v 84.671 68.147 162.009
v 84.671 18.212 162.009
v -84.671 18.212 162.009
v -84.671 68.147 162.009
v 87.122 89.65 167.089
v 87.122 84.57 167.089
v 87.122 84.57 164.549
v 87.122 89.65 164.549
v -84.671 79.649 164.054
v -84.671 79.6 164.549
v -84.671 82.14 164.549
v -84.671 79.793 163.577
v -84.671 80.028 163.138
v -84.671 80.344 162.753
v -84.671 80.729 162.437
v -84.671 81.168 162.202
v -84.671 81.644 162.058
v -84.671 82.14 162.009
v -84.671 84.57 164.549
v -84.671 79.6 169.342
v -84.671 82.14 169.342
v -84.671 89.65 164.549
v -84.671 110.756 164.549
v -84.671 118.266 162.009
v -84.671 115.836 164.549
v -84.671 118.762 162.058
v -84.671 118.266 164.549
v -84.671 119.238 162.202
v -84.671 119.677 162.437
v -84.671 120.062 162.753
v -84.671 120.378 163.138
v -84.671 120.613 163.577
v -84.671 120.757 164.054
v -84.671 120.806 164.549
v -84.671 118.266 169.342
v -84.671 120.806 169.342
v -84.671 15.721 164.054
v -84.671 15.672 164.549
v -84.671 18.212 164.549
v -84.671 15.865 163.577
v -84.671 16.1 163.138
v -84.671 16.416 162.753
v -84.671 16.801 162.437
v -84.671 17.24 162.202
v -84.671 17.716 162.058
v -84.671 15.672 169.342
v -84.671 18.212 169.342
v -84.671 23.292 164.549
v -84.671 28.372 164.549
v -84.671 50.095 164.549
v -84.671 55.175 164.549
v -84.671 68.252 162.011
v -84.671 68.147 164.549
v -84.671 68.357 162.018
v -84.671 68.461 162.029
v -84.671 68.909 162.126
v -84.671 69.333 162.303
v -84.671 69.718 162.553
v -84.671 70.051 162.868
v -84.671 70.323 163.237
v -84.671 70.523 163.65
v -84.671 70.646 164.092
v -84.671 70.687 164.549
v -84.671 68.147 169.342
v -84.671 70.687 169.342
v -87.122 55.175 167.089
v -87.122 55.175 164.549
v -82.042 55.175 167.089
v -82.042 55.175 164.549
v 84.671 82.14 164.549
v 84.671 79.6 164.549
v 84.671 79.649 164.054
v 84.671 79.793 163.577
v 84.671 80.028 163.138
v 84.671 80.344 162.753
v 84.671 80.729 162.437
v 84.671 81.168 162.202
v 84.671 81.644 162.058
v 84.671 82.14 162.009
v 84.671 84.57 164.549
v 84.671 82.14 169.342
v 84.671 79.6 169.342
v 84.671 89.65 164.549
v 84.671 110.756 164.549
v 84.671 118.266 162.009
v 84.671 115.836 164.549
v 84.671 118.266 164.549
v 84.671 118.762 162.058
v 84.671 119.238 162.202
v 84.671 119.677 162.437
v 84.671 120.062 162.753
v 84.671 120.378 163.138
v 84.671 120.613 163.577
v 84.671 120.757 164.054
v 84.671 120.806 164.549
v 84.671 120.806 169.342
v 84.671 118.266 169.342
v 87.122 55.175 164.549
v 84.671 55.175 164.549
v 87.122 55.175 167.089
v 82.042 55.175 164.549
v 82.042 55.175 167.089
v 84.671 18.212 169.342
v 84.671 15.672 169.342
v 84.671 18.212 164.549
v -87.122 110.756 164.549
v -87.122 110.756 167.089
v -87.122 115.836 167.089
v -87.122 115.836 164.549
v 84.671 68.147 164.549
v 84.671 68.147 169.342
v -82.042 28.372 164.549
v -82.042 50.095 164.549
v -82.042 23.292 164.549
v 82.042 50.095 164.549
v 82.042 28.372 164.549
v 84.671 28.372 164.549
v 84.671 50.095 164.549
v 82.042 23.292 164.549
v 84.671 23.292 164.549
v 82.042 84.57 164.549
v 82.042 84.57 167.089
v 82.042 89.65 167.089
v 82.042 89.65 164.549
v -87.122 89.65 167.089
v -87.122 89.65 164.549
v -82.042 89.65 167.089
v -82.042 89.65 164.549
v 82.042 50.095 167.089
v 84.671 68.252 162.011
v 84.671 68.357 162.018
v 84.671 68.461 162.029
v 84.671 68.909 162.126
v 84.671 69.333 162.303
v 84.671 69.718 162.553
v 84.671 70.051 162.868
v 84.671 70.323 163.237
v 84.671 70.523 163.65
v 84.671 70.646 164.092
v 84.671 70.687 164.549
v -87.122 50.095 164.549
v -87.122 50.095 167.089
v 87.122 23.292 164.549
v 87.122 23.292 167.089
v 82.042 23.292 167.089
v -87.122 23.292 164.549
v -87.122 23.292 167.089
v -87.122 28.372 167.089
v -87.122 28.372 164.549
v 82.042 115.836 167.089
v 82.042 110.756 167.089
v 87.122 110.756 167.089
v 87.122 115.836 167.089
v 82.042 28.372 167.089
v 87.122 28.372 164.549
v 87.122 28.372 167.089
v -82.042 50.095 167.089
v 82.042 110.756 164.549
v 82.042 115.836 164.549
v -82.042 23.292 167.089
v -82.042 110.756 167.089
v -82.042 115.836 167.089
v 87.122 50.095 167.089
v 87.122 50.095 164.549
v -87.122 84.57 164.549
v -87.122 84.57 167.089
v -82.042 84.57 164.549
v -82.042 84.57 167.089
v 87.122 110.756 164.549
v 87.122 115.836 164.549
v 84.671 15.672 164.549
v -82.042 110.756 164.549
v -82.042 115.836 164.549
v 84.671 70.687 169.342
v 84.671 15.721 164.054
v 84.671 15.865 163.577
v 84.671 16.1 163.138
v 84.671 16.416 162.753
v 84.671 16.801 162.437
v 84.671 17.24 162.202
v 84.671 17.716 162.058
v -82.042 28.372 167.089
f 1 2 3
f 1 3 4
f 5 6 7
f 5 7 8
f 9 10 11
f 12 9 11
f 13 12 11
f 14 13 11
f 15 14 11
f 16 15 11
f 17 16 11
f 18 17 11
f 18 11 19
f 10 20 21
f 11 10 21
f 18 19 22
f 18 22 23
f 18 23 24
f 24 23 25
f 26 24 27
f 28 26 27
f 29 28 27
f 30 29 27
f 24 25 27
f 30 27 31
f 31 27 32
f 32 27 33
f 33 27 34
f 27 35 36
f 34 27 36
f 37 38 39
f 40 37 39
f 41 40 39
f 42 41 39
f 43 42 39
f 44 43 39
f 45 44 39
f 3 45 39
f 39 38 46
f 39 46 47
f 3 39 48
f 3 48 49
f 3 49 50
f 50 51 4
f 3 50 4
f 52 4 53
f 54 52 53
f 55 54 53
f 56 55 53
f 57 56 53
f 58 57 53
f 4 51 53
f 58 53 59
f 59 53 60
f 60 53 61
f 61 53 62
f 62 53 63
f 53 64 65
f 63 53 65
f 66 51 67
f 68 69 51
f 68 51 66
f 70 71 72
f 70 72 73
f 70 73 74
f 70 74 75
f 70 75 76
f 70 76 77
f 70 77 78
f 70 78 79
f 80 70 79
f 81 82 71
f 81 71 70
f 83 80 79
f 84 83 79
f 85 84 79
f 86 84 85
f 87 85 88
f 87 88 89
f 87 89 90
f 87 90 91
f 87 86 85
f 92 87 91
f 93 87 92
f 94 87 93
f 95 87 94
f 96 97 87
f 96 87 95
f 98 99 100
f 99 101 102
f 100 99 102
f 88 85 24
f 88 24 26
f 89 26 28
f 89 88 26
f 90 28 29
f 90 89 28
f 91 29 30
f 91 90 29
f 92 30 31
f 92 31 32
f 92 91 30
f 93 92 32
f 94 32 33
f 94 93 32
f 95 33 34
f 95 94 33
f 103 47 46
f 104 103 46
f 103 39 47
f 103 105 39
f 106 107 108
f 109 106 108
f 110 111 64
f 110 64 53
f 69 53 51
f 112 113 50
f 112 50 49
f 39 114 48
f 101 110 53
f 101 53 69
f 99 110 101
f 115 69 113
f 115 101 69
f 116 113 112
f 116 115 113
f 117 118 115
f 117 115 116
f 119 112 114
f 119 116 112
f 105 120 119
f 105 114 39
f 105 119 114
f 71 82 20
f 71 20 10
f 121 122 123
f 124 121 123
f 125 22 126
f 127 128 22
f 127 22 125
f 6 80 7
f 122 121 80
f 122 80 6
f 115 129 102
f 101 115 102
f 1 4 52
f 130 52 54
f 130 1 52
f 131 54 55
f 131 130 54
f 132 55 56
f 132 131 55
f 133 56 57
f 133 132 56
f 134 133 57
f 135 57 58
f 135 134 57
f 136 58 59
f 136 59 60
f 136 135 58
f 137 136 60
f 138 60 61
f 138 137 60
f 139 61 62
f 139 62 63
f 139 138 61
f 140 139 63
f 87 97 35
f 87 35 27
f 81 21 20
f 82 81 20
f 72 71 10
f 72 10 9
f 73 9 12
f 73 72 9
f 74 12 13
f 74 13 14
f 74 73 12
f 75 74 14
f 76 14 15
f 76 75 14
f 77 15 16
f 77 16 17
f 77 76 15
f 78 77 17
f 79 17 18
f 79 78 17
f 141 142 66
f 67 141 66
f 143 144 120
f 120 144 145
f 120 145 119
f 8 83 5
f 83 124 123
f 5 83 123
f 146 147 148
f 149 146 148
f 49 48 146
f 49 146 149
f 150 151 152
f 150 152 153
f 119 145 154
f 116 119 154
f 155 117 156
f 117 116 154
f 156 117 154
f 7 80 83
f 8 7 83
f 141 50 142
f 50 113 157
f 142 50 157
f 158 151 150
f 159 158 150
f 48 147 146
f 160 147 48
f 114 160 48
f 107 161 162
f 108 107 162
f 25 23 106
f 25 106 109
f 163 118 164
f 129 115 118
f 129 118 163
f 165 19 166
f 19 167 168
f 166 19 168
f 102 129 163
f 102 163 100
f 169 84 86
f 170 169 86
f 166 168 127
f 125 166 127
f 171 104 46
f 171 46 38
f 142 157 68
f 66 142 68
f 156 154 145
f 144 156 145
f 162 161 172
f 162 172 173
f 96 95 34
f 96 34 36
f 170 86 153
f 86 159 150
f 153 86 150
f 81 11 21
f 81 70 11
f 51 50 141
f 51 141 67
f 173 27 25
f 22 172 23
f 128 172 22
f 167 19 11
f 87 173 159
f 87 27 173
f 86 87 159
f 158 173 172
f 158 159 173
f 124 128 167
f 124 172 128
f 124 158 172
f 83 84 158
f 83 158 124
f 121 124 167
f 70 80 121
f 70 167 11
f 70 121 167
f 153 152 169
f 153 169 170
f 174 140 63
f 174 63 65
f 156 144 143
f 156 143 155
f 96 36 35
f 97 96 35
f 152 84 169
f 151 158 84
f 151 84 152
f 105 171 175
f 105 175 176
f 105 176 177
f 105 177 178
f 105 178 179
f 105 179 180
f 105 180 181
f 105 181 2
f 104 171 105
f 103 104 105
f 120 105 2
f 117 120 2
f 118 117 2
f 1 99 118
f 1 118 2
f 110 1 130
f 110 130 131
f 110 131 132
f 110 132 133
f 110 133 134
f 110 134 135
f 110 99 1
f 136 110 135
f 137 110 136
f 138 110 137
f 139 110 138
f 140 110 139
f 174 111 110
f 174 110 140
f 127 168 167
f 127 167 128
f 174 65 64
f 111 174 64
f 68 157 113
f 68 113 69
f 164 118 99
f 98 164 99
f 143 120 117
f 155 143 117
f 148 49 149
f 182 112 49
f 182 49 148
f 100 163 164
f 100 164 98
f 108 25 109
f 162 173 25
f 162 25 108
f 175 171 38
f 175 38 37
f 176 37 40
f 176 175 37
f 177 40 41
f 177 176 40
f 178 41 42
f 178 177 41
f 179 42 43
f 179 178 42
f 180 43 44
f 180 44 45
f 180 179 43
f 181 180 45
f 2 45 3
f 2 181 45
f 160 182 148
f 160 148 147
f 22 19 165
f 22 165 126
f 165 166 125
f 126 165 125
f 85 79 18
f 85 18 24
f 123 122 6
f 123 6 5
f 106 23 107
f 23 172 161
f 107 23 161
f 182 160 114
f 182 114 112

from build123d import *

# Parameters (mm, degrees)
F1_DEPTH = 84.6709
F2_START = 82.042
F0_W     = 5.08
F0_H     = 2.54
F2_DEPTH = 5.08
F3_START = -82.042
F3_DEPTH = 5.08


with BuildPart() as f1:
    # F0 (on Right) → F1 (new body, symmetric)
    with BuildSketch(Plane.YZ):
        with BuildLine():
            Line((18.2118, 169.3418), (15.6718, 169.3418))
            Line((15.6718, 169.3418), (15.6718, 164.5491375))
            ThreePointArc((15.6718, 164.5491375), (16.4157487758, 162.7530862758), (18.2118, 162.0091375))
            Line((18.2118, 162.0091375), (68.1474244764, 162.0091375))
            ThreePointArc((68.1474244764, 162.0091375), (68.3044763435, 162.0139975214), (68.4609272063, 162.0285589874))
            Line((68.4609272063, 162.0285589874), (69.6856973646, 162.9407926238))
            Line((69.6856973646, 162.9407926238), (68.1474244764, 165.0060867035))
            Line((68.1474244764, 165.0060867035), (68.1474244764, 164.5491375))
            Line((68.1474244764, 164.5491375), (55.1748093832, 164.5491375))
            Line((55.1748093832, 164.5491375), (50.0948093832, 164.5491375))
            Line((50.0948093832, 164.5491375), (28.3718, 164.5491375))
            Line((28.3718, 164.5491375), (23.2918, 164.5491375))
            Line((23.2918, 164.5491375), (18.2118, 164.5491375))
            Line((18.2118, 164.5491375), (18.2118, 169.3418))
        make_face()
        with BuildLine():
            Line((70.6874244764, 169.3418), (68.1474244764, 169.3418))
            Line((68.1474244764, 169.3418), (68.1474244764, 165.0060867035))
            Line((68.1474244764, 165.0060867035), (69.6856973646, 162.9407926238))
            Line((69.6856973646, 162.9407926238), (68.4609272063, 162.0285589874))
            ThreePointArc((68.4609272063, 162.0285589874), (70.0510915867, 162.8675752701), (70.6874244764, 164.5491375))
            Line((70.6874244764, 164.5491375), (70.6874244764, 165.8480664454))
            Line((70.6874244764, 165.8480664454), (70.6874244764, 169.3418))
        make_face()
    extrude(amount=F1_DEPTH, both=True)

    # F0 (on Right) → F2 (join)
    with BuildSketch(Plane.YZ.offset(F2_START)):
        with Locations((52.6348093832, 165.8191375)):
            Rectangle(F0_W, F0_H)
        Polygon((23.2918, 167.0891375), (23.2918, 164.5491375), (28.3718, 164.5491375), (28.3718, 167.0891375), align=None)
    extrude(amount=F2_DEPTH)

    # F0 (on Right) → F3 (join)
    with BuildSketch(Plane.YZ.offset(F3_START)):
        Polygon((23.2918, 167.0891375), (23.2918, 164.5491375), (28.3718, 164.5491375), (28.3718, 167.0891375), align=None)
        with Locations((52.6348093832, 165.8191375)):
            Rectangle(F0_W, F0_H)
    extrude(amount=-F3_DEPTH)


with BuildPart() as f1b:
    # F0 (on Right) → F1, piece 2 (new body, symmetric)
    with BuildSketch(Plane.YZ):
        with BuildLine():
            Line((82.1398573303, 169.3418), (79.5998573303, 169.3418))
            Line((79.5998573303, 169.3418), (79.5998573303, 164.5491375))
            ThreePointArc((79.5998573303, 164.5491375), (80.3438061061, 162.7530862758), (82.1398573303, 162.0091375))
            Line((82.1398573303, 162.0091375), (100.203, 162.0091375))
            Line((100.203, 162.0091375), (100.203, 164.5491375))
            Line((100.203, 164.5491375), (89.6502663064, 164.5491375))
            Line((89.6502663064, 164.5491375), (84.5702663064, 164.5491375))
            Line((84.5702663064, 164.5491375), (82.1398573303, 164.5491375))
            Line((82.1398573303, 164.5491375), (82.1398573303, 169.3418))
        make_face()
        with BuildLine():
            Line((120.8061426697, 169.3418), (118.2661426697, 169.3418))
            Line((118.2661426697, 169.3418), (118.2661426697, 164.5491375))
            Line((118.2661426697, 164.5491375), (115.8357336936, 164.5491375))
            Line((115.8357336936, 164.5491375), (110.7557336936, 164.5491375))
            Line((110.7557336936, 164.5491375), (100.203, 164.5491375))
            Line((100.203, 164.5491375), (100.203, 162.0091375))
            Line((100.203, 162.0091375), (118.2661426697, 162.0091375))
            ThreePointArc((118.2661426697, 162.0091375), (120.0621938939, 162.7530862758), (120.8061426697, 164.5491375))
            Line((120.8061426697, 164.5491375), (120.8061426697, 169.3418))
        make_face()
    extrude(amount=F1_DEPTH, both=True)

    # F0 (on Right) → F2, piece 2 (join)
    with BuildSketch(Plane.YZ.offset(F2_START)):
        with Locations((87.1102663064, 165.8191375)):
            Rectangle(F0_W, F0_H)
        with Locations((113.2957336936, 165.8191375)):
            Rectangle(F0_W, F0_H)
    extrude(amount=F2_DEPTH)

    # F0 (on Right) → F3, piece 2 (join)
    with BuildSketch(Plane.YZ.offset(F3_START)):
        with Locations((87.1102663064, 165.8191375)):
            Rectangle(F0_W, F0_H)
        with Locations((113.2957336936, 165.8191375)):
            Rectangle(F0_W, F0_H)
    extrude(amount=-F3_DEPTH)


solid = Compound([f1.part, f1b.part])
